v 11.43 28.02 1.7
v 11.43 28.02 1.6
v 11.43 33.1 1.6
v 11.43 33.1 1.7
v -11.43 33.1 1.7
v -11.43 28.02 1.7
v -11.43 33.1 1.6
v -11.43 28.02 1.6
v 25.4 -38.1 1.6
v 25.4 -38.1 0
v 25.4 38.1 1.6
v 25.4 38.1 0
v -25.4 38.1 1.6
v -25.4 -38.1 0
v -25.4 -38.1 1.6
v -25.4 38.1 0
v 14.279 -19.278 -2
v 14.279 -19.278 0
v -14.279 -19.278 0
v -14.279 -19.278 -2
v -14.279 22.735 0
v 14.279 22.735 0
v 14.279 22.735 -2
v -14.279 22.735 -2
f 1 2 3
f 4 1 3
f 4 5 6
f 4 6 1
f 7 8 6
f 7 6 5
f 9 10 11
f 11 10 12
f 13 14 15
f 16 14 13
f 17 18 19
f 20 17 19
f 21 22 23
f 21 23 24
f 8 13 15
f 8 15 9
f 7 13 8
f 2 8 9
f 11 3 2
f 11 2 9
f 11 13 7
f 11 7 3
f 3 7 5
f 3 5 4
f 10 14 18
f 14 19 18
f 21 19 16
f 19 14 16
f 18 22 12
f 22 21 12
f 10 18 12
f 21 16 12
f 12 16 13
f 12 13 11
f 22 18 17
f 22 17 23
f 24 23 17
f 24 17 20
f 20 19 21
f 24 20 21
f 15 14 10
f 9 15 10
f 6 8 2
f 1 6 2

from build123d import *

# Parameters (mm, degrees)
SKETCH1_W           = 50.8
SKETCH1_H           = 76.2
BOSS_EXTRUDE1_DEPTH = 1.6
SKETCH3_W           = 22.86
SKETCH3_H           = 5.08
BOSS_EXTRUDE2_DEPTH = 0.1
SKETCH6_W           = 28.557161976
SKETCH6_H           = 42.013432375
BOSS_EXTRUDE3_DEPTH = 2


with BuildPart() as part:
    # Sketch1 → Boss-Extrude1 (new body)
    with BuildSketch(Plane.XY):
        Rectangle(SKETCH1_W, SKETCH1_H)
    extrude(amount=BOSS_EXTRUDE1_DEPTH)

    # Sketch3 → Boss-Extrude2 (add)
    with BuildSketch(Plane.XY.offset(1.6)):
        with Locations((0, 30.56)):
            Rectangle(SKETCH3_W, SKETCH3_H)
    extrude(amount=BOSS_EXTRUDE2_DEPTH)

    # Sketch6 → Boss-Extrude3 (add)
    with BuildSketch(Plane(origin=(0, 0, 0), x_dir=(-1, 0, 0), z_dir=(0, 0, -1))):
        with Locations((0, 1.728458928)):
            Rectangle(SKETCH6_W, SKETCH6_H)
    extrude(amount=BOSS_EXTRUDE3_DEPTH)


solid = part.part
